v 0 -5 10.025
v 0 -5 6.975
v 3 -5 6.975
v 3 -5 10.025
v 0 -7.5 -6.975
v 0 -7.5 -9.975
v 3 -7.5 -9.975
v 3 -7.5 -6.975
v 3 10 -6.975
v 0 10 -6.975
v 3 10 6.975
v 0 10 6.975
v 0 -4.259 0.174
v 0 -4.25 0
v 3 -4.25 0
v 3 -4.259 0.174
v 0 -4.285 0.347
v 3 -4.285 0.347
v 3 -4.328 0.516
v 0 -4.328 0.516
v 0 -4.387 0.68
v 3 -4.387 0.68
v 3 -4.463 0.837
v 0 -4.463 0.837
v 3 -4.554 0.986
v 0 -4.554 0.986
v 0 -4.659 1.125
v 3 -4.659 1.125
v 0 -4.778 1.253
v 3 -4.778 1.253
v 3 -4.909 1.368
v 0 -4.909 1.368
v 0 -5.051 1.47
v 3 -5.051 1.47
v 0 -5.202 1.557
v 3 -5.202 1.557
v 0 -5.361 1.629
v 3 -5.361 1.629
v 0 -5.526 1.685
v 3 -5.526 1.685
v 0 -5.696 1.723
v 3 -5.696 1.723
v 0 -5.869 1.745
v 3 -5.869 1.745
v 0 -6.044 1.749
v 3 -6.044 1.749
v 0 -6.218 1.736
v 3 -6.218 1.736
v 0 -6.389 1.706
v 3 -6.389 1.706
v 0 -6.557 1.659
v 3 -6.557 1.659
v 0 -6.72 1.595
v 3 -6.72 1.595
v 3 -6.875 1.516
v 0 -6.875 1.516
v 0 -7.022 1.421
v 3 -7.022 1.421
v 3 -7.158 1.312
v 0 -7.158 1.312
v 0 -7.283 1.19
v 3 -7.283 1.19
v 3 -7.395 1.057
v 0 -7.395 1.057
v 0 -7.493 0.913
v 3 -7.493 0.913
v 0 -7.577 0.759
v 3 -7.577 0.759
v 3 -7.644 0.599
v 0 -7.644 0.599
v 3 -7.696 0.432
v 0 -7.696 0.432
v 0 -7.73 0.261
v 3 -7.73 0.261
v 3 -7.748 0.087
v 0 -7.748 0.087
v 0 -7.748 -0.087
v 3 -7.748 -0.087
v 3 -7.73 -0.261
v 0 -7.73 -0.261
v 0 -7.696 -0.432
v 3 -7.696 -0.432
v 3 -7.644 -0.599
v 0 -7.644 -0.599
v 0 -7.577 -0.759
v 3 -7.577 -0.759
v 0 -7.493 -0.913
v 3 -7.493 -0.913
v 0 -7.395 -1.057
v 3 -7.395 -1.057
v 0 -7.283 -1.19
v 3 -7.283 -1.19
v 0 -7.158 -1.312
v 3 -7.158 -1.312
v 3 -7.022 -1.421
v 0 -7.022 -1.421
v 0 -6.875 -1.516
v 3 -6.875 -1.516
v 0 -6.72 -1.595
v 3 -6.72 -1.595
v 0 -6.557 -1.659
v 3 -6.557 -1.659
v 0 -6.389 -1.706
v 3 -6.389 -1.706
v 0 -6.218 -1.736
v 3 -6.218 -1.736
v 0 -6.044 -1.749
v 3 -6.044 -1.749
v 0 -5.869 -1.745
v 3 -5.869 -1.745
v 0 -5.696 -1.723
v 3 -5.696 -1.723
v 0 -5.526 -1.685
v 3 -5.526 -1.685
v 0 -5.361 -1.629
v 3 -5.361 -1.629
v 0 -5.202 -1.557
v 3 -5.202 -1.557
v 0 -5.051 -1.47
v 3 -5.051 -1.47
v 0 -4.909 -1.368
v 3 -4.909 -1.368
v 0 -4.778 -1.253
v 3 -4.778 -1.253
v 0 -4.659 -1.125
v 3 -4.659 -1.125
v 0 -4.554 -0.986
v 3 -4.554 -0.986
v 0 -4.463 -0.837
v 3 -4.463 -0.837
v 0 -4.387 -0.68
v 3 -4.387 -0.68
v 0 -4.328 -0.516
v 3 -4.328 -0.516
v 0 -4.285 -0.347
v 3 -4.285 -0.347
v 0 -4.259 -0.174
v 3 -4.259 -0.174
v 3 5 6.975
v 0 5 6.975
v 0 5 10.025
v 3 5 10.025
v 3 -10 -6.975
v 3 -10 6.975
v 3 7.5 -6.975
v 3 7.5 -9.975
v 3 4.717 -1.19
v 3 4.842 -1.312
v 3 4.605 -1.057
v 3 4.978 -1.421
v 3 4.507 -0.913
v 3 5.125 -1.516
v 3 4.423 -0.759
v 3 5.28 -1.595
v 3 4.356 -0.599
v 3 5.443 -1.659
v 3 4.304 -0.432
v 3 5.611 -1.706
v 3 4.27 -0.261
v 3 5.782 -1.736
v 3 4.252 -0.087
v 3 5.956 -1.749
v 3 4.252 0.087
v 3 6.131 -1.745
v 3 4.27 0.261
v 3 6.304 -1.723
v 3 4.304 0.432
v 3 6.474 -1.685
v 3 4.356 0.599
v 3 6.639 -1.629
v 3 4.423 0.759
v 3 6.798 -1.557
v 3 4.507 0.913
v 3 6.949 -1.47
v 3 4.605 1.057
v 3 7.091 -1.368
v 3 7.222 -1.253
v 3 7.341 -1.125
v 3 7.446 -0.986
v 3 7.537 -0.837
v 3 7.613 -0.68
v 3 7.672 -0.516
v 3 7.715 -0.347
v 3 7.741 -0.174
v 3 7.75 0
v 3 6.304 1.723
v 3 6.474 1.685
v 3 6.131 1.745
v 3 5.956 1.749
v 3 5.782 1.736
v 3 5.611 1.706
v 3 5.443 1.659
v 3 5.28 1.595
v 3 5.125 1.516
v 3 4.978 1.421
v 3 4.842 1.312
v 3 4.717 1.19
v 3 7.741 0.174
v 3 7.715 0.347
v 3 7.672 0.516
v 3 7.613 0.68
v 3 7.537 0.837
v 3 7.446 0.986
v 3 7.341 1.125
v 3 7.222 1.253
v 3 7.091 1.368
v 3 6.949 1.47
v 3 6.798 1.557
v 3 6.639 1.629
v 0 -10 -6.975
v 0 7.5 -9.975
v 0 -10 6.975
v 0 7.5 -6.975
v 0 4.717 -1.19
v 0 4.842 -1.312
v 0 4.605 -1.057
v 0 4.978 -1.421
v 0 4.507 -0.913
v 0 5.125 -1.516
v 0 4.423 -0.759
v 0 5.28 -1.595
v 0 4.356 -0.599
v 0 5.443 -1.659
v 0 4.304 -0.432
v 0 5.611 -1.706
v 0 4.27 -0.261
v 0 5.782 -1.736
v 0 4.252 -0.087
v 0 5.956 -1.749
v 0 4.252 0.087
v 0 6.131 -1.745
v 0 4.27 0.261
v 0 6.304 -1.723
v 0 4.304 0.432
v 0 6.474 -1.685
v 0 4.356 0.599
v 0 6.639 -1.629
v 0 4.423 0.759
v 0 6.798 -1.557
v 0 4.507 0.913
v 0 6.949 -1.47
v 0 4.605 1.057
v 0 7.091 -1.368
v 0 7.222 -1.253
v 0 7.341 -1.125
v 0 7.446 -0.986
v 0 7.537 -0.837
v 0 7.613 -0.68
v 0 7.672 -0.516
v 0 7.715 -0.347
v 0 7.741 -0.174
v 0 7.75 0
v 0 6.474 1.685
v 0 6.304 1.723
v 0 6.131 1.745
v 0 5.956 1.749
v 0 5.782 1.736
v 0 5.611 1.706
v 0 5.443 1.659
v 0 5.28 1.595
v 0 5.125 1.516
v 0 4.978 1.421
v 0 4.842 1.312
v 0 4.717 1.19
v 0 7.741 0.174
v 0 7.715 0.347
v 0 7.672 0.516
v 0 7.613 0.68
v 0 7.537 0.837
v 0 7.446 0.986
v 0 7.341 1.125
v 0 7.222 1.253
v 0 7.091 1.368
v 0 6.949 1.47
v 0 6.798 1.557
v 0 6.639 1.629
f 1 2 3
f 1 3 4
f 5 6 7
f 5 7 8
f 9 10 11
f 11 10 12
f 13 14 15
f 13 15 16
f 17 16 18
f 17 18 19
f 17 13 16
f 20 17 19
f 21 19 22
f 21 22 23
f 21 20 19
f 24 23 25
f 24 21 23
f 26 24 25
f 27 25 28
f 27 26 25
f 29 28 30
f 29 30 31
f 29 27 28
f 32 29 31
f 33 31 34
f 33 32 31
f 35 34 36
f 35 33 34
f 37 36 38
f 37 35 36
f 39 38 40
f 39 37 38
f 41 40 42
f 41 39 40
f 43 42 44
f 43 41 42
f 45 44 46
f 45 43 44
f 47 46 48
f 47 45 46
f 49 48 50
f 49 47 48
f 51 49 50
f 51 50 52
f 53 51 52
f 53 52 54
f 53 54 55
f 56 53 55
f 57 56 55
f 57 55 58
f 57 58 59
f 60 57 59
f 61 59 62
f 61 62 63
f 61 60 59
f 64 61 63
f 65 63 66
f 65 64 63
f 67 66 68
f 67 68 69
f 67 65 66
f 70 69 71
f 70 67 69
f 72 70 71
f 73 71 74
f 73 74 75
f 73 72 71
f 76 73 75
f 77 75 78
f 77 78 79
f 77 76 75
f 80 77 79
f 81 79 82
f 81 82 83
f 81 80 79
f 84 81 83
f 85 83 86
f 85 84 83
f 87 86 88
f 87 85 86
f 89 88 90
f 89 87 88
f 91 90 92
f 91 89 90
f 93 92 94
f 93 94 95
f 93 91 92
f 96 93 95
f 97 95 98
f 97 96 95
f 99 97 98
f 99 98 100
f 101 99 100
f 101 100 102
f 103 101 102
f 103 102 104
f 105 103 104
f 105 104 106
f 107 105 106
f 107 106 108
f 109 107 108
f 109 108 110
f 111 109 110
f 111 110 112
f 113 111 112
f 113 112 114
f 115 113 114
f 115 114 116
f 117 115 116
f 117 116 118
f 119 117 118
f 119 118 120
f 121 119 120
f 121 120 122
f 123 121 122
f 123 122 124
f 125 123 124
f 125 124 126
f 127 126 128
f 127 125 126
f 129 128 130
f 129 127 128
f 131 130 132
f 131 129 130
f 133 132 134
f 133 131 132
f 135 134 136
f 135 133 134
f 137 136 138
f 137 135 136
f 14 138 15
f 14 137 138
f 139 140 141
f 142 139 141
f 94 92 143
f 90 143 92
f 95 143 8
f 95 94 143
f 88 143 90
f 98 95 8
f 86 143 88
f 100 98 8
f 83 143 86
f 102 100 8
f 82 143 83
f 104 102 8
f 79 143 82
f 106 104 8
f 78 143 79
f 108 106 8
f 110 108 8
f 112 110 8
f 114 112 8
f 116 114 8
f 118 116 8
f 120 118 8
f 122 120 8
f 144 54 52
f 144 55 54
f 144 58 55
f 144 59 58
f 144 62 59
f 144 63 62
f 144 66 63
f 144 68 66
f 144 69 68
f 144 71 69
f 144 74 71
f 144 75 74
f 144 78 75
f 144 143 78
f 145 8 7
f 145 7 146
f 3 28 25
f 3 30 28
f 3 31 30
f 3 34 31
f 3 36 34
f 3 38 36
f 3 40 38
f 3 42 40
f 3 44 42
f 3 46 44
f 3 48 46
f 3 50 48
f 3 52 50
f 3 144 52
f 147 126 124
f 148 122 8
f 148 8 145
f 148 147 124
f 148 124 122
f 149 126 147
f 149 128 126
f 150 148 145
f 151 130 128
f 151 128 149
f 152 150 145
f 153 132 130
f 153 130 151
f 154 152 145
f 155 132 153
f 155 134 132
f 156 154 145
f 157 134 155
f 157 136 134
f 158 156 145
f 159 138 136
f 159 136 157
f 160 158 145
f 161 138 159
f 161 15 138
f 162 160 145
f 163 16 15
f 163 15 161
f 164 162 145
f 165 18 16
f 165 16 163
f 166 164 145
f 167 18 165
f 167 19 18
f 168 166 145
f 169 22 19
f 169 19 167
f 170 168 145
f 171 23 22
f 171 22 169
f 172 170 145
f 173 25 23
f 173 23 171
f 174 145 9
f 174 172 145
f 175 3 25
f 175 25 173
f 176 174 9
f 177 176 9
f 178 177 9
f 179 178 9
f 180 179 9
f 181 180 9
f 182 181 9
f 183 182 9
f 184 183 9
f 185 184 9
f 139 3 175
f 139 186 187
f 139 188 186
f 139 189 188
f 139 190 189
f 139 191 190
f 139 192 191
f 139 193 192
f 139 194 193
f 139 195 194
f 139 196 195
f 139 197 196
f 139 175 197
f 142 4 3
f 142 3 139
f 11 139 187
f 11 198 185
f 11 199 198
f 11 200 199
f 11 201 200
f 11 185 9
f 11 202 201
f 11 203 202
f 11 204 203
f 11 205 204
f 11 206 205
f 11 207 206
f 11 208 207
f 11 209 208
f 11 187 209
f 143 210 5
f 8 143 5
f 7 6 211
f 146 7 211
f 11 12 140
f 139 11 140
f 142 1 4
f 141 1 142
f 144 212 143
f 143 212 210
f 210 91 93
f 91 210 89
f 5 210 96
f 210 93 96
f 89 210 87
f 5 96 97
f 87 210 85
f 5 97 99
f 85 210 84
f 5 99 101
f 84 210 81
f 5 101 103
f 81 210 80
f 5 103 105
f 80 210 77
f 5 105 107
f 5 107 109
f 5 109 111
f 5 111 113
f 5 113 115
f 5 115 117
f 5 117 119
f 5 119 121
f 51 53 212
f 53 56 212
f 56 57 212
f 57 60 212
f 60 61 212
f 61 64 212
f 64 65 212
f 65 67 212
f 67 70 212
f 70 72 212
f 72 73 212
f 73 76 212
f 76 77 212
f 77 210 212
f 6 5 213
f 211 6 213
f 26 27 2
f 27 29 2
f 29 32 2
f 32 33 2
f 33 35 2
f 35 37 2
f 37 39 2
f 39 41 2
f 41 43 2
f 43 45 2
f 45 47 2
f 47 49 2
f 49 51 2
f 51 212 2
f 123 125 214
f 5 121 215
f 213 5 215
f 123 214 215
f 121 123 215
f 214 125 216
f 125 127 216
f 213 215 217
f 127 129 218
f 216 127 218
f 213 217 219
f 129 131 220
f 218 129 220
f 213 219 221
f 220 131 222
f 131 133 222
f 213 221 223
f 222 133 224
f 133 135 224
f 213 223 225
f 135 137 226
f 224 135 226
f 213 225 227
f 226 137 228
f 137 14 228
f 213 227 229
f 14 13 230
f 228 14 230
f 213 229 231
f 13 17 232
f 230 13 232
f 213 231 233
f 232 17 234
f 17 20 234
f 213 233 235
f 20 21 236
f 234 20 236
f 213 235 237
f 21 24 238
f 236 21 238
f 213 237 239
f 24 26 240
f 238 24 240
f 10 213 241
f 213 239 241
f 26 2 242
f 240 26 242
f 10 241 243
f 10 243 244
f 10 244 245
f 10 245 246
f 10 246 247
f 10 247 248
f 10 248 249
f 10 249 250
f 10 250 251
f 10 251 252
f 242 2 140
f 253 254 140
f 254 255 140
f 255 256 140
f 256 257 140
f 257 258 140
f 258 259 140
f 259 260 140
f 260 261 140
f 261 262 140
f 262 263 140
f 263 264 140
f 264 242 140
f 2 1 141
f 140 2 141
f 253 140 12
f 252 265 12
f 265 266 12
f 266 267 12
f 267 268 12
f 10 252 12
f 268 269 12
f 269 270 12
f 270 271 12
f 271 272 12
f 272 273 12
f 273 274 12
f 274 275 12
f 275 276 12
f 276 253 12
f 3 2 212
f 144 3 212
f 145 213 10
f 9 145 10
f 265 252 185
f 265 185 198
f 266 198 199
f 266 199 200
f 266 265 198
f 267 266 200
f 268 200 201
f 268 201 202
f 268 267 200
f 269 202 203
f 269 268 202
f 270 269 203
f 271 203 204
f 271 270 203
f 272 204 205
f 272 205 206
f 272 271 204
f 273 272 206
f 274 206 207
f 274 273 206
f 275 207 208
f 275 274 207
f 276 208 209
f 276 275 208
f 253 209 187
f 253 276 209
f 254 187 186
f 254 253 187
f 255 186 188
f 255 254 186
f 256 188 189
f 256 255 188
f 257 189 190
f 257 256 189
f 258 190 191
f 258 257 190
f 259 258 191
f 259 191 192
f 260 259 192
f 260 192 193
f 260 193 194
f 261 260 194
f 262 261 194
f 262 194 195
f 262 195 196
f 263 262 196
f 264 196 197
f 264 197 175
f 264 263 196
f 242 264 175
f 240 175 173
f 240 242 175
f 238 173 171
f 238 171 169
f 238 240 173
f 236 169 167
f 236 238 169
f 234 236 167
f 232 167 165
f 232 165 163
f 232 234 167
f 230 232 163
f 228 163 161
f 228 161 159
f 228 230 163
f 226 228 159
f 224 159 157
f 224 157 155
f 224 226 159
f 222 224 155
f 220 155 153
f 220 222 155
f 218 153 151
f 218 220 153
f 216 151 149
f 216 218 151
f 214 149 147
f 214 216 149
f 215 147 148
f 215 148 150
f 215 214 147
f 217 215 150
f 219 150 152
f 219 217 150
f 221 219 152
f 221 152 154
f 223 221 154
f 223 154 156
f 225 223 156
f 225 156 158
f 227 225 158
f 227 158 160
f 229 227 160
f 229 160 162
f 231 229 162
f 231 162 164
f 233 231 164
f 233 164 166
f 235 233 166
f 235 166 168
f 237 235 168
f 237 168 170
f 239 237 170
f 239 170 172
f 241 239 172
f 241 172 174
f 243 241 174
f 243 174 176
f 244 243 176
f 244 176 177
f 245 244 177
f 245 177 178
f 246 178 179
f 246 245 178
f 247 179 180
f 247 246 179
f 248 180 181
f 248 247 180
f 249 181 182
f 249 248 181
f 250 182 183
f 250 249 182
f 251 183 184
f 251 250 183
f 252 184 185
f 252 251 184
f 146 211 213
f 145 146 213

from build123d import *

# Parameters (mm, degrees)
F0_W     = 15
F0_H     = 3
F0_R     = 1.75
F0_W_2   = 10
F0_H_2   = 3.05
F1_DEPTH = 3


# Not quite as in the source:
# - a feature names something its author has since deleted; it is built from what else it names


with BuildPart() as f1:
    # F0 (on Right) → F1 (new body)
    with BuildSketch(Plane.YZ):
        with Locations((0, -8.475)):
            Rectangle(F0_W, F0_H)
        Polygon((7.5, -6.975), (10, -6.975), (10, 6.975), (5, 6.975), (-5, 6.975), (-10, 6.975), (-10, -6.975), (-7.5, -6.975), align=None)
        with Locations((-6, 0)):
            Circle(F0_R, mode=Mode.SUBTRACT)
        with Locations((6, 0)):
            Circle(F0_R, mode=Mode.SUBTRACT)
        with Locations((0, 8.5)):
            Rectangle(F0_W_2, F0_H_2)
    extrude(amount=F1_DEPTH)


solid = f1.part
